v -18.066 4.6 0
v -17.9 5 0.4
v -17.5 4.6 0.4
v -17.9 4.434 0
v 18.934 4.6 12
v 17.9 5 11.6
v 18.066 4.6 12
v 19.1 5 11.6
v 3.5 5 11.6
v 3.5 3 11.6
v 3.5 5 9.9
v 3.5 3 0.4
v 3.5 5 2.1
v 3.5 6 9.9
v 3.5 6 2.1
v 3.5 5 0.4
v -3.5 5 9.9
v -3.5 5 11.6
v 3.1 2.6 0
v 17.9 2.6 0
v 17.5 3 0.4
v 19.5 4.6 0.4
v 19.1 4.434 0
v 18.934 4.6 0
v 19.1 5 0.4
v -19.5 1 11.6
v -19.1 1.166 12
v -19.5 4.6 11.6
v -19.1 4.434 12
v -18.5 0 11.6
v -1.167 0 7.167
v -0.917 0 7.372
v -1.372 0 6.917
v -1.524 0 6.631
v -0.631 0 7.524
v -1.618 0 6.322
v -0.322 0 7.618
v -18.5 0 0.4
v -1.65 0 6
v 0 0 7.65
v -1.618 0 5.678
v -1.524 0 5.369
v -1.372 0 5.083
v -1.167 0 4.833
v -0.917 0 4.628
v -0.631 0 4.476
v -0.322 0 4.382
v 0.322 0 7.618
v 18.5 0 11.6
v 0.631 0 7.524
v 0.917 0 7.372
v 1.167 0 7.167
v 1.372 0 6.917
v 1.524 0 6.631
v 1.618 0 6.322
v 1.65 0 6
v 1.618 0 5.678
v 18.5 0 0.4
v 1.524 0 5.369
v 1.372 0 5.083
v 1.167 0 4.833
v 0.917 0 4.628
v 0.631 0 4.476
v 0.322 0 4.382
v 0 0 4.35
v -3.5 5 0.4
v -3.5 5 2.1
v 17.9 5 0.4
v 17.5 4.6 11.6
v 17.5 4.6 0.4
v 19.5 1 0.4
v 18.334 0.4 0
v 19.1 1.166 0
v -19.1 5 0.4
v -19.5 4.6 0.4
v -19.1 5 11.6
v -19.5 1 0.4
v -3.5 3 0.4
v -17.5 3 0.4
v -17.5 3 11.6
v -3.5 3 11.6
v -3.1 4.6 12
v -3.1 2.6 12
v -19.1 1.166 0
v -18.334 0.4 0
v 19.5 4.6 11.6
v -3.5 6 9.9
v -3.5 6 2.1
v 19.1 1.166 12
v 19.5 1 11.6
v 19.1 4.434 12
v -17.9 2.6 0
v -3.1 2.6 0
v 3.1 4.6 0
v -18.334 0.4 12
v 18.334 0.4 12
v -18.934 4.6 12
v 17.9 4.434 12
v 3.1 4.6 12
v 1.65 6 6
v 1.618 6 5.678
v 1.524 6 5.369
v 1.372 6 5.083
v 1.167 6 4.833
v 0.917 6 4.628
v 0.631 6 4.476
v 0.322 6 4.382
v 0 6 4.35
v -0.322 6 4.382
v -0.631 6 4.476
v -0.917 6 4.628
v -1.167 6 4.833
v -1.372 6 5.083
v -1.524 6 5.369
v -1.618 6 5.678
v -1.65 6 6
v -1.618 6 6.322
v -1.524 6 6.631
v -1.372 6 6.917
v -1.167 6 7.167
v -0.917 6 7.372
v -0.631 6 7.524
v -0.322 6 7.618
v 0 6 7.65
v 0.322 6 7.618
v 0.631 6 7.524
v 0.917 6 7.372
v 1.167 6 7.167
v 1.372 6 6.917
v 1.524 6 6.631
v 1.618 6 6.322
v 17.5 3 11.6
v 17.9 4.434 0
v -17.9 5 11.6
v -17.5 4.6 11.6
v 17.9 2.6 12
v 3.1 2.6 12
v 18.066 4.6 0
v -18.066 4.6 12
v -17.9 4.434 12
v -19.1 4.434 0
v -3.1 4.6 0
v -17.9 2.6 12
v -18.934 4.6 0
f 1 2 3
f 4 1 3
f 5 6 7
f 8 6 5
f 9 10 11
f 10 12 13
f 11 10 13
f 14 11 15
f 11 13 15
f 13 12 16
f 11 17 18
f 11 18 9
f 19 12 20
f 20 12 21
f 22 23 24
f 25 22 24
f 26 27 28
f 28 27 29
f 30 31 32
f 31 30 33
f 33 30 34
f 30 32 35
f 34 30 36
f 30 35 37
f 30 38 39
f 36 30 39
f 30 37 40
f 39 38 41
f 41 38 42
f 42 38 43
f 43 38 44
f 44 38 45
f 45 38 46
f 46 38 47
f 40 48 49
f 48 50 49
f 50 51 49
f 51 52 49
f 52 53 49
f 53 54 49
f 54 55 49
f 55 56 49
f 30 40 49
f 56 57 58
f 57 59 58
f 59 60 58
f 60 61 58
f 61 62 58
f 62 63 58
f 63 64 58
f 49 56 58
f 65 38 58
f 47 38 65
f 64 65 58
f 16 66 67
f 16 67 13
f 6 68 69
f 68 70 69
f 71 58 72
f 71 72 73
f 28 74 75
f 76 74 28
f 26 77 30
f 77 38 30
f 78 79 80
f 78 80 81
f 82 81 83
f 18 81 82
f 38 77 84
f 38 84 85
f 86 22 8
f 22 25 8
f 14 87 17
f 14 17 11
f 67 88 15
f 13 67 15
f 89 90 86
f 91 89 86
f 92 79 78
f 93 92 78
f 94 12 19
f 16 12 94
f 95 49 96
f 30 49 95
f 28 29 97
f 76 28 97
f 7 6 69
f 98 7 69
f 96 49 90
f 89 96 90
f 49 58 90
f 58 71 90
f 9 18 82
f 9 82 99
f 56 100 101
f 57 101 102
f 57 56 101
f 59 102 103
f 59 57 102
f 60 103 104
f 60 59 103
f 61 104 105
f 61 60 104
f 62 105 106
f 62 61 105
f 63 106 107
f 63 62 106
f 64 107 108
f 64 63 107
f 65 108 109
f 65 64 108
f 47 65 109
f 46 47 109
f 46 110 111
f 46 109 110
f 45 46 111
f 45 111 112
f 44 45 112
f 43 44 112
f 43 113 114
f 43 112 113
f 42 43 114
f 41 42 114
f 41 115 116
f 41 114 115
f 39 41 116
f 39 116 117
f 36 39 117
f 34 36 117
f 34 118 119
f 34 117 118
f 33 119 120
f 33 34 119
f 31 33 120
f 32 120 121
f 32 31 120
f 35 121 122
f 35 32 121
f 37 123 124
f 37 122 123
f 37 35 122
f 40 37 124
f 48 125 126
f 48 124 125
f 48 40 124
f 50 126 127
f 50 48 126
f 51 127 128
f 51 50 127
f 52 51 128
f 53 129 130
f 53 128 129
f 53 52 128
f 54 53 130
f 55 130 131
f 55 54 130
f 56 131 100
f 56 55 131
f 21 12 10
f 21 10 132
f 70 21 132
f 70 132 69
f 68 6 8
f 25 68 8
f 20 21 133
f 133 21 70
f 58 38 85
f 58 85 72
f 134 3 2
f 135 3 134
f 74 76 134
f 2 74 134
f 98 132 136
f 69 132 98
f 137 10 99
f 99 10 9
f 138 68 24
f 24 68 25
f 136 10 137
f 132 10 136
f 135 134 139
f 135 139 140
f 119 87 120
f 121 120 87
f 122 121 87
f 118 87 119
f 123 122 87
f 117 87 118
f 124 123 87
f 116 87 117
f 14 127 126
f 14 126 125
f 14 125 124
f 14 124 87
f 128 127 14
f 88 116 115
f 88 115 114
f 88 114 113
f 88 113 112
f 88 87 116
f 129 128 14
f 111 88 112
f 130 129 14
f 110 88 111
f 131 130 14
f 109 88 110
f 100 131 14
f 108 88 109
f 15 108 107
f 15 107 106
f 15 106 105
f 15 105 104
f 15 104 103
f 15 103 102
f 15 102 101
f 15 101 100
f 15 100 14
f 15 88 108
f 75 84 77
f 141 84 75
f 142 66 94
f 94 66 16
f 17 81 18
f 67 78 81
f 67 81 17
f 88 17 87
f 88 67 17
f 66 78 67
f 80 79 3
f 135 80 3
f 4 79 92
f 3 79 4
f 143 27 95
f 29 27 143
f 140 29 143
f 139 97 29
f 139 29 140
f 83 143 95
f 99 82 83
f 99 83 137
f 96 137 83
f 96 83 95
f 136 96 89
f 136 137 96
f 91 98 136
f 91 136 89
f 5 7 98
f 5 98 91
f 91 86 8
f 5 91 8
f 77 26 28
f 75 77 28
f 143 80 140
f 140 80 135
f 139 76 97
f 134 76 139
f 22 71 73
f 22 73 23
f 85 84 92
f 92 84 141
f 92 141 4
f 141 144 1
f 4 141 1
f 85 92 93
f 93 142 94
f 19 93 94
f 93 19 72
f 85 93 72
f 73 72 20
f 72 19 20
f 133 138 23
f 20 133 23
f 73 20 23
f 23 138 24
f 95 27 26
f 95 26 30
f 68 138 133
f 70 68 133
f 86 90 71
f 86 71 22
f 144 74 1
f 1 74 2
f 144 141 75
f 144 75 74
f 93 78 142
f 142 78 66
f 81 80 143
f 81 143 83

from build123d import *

# Parameters (mm, degrees)
CYLINDER002_R     = 1.65
CYLINDER002_DEPTH = 10
BOX005_W          = 7
BOX005_H          = 5
BOX005_DEPTH      = 12
BOX006_W          = 14
BOX006_H          = 3
BOX006_DEPTH      = 12
BOX007_W          = 2
BOX007_H          = 5
BOX007_DEPTH      = 12
BOX008_W          = 14
BOX008_H          = 3
BOX008_DEPTH      = 12
BOX009_W          = 2
BOX009_H          = 5
BOX009_DEPTH      = 12
BOX010_W          = 7
BOX010_H          = 2
BOX010_DEPTH      = 7.8
CHAMFER006_SIZE   = 1
CHAMFER007_SIZE   = 0.4
CHAMFER008_SIZE   = 0.4


with BuildPart() as cylinder002:
    # Cylinder002 → Cylinder002 (new body)
    with BuildSketch(Plane(origin=(0, 0, 6), x_dir=(1, 0, 0), z_dir=(0, 1, 0))):
        Circle(CYLINDER002_R)
    extrude(amount=CYLINDER002_DEPTH)


with BuildPart() as cube005:
    # Box005 → Box005 (new body)
    with BuildSketch(Plane(origin=(-3.5, 0, 0), x_dir=(1, 0, 0), z_dir=(0, 0, 1))):
        with Locations((3.5, 2.5)):
            Rectangle(BOX005_W, BOX005_H)
    extrude(amount=BOX005_DEPTH)


with BuildPart() as cube006:
    # Box006 → Box006 (new body)
    with BuildSketch(Plane(origin=(3.5, 0, 0), x_dir=(1, 0, 0), z_dir=(0, 0, 1))):
        with Locations((7, 1.5)):
            Rectangle(BOX006_W, BOX006_H)
    extrude(amount=BOX006_DEPTH)


with BuildPart() as cube007:
    # Box007 → Box007 (new body)
    with BuildSketch(Plane(origin=(17.5, 0, 0), x_dir=(1, 0, 0), z_dir=(0, 0, 1))):
        with Locations((1, 2.5)):
            Rectangle(BOX007_W, BOX007_H)
    extrude(amount=BOX007_DEPTH)


with BuildPart() as cube008:
    # Box008 → Box008 (new body)
    with BuildSketch(Plane(origin=(-17.5, 0, 0), x_dir=(1, 0, 0), z_dir=(0, 0, 1))):
        with Locations((7, 1.5)):
            Rectangle(BOX008_W, BOX008_H)
    extrude(amount=BOX008_DEPTH)


with BuildPart() as cube009:
    # Box009 → Box009 (new body)
    with BuildSketch(Plane(origin=(-19.5, 0, 0), x_dir=(1, 0, 0), z_dir=(0, 0, 1))):
        with Locations((1, 2.5)):
            Rectangle(BOX009_W, BOX009_H)
    extrude(amount=BOX009_DEPTH)


with BuildPart() as chamfer008:
    # Box010 → Box010 (new body)
    with BuildSketch(Plane(origin=(-3.5, 4, 2.1), x_dir=(1, 0, 0), z_dir=(0, 0, 1))):
        with Locations((3.5, 1)):
            Rectangle(BOX010_W, BOX010_H)
    extrude(amount=BOX010_DEPTH)

    # Fusion003: union Cube005, Cube006, Cube007, Cube008, Cube009
    add(cube005.part)
    add(cube006.part)
    add(cube007.part)
    add(cube008.part)
    add(cube009.part)

    # Cut003: cut Cylinder002
    add(cylinder002.part, mode=Mode.SUBTRACT)

    # Chamfer006
    chamfer006_edges = [chamfer008.edges().sort_by_distance(p)[0] for p in [
        (-19.5, 0, 6),
        (19.5, 0, 6),
    ]]
    chamfer(chamfer006_edges, length=CHAMFER006_SIZE)

    # Chamfer007
    chamfer007_edges = [chamfer008.edges().sort_by_distance(p)[0] for p in [
        (-19.5, 5, 6),
        (-17.5, 5, 6),
        (19.5, 5, 6),
        (17.5, 5, 6),
    ]]
    chamfer(chamfer007_edges, length=CHAMFER007_SIZE)

    # Chamfer008
    chamfer008_edges = [chamfer008.edges().sort_by_distance(p)[0] for p in [
        (-19.5, 2.8, 12),
        (-19.5, 2.8, 0),
        (-19, 0.5, 12),
        (0, 0, 12),
        (19, 0.5, 12),
        (19.5, 2.8, 12),
        (19.3, 4.8, 12),
        (18.5, 5, 12),
        (17.7, 4.8, 12),
        (17.5, 3.8, 12),
        (10.5, 3, 12),
        (3.5, 4, 12),
        (0, 5, 12),
        (-3.5, 4, 12),
        (-10.5, 3, 12),
        (-17.5, 3.8, 12),
        (-17.7, 4.8, 12),
        (-18.5, 5, 12),
        (-19.3, 4.8, 12),
        (-19.3, 4.8, 0),
        (-19, 0.5, 0),
        (19.5, 2.8, 0),
        (19, 0.5, 0),
        (0, 0, 0),
        (-18.5, 5, 0),
        (-17.7, 4.8, 0),
        (-17.5, 3.8, 0),
        (-10.5, 3, 0),
        (-3.5, 4, 0),
        (0, 5, 0),
        (3.5, 4, 0),
        (10.5, 3, 0),
        (17.5, 3.8, 0),
        (17.7, 4.8, 0),
        (18.5, 5, 0),
        (19.3, 4.8, 0),
    ]]
    chamfer(chamfer008_edges, length=CHAMFER008_SIZE)


solid = chamfer008.part
